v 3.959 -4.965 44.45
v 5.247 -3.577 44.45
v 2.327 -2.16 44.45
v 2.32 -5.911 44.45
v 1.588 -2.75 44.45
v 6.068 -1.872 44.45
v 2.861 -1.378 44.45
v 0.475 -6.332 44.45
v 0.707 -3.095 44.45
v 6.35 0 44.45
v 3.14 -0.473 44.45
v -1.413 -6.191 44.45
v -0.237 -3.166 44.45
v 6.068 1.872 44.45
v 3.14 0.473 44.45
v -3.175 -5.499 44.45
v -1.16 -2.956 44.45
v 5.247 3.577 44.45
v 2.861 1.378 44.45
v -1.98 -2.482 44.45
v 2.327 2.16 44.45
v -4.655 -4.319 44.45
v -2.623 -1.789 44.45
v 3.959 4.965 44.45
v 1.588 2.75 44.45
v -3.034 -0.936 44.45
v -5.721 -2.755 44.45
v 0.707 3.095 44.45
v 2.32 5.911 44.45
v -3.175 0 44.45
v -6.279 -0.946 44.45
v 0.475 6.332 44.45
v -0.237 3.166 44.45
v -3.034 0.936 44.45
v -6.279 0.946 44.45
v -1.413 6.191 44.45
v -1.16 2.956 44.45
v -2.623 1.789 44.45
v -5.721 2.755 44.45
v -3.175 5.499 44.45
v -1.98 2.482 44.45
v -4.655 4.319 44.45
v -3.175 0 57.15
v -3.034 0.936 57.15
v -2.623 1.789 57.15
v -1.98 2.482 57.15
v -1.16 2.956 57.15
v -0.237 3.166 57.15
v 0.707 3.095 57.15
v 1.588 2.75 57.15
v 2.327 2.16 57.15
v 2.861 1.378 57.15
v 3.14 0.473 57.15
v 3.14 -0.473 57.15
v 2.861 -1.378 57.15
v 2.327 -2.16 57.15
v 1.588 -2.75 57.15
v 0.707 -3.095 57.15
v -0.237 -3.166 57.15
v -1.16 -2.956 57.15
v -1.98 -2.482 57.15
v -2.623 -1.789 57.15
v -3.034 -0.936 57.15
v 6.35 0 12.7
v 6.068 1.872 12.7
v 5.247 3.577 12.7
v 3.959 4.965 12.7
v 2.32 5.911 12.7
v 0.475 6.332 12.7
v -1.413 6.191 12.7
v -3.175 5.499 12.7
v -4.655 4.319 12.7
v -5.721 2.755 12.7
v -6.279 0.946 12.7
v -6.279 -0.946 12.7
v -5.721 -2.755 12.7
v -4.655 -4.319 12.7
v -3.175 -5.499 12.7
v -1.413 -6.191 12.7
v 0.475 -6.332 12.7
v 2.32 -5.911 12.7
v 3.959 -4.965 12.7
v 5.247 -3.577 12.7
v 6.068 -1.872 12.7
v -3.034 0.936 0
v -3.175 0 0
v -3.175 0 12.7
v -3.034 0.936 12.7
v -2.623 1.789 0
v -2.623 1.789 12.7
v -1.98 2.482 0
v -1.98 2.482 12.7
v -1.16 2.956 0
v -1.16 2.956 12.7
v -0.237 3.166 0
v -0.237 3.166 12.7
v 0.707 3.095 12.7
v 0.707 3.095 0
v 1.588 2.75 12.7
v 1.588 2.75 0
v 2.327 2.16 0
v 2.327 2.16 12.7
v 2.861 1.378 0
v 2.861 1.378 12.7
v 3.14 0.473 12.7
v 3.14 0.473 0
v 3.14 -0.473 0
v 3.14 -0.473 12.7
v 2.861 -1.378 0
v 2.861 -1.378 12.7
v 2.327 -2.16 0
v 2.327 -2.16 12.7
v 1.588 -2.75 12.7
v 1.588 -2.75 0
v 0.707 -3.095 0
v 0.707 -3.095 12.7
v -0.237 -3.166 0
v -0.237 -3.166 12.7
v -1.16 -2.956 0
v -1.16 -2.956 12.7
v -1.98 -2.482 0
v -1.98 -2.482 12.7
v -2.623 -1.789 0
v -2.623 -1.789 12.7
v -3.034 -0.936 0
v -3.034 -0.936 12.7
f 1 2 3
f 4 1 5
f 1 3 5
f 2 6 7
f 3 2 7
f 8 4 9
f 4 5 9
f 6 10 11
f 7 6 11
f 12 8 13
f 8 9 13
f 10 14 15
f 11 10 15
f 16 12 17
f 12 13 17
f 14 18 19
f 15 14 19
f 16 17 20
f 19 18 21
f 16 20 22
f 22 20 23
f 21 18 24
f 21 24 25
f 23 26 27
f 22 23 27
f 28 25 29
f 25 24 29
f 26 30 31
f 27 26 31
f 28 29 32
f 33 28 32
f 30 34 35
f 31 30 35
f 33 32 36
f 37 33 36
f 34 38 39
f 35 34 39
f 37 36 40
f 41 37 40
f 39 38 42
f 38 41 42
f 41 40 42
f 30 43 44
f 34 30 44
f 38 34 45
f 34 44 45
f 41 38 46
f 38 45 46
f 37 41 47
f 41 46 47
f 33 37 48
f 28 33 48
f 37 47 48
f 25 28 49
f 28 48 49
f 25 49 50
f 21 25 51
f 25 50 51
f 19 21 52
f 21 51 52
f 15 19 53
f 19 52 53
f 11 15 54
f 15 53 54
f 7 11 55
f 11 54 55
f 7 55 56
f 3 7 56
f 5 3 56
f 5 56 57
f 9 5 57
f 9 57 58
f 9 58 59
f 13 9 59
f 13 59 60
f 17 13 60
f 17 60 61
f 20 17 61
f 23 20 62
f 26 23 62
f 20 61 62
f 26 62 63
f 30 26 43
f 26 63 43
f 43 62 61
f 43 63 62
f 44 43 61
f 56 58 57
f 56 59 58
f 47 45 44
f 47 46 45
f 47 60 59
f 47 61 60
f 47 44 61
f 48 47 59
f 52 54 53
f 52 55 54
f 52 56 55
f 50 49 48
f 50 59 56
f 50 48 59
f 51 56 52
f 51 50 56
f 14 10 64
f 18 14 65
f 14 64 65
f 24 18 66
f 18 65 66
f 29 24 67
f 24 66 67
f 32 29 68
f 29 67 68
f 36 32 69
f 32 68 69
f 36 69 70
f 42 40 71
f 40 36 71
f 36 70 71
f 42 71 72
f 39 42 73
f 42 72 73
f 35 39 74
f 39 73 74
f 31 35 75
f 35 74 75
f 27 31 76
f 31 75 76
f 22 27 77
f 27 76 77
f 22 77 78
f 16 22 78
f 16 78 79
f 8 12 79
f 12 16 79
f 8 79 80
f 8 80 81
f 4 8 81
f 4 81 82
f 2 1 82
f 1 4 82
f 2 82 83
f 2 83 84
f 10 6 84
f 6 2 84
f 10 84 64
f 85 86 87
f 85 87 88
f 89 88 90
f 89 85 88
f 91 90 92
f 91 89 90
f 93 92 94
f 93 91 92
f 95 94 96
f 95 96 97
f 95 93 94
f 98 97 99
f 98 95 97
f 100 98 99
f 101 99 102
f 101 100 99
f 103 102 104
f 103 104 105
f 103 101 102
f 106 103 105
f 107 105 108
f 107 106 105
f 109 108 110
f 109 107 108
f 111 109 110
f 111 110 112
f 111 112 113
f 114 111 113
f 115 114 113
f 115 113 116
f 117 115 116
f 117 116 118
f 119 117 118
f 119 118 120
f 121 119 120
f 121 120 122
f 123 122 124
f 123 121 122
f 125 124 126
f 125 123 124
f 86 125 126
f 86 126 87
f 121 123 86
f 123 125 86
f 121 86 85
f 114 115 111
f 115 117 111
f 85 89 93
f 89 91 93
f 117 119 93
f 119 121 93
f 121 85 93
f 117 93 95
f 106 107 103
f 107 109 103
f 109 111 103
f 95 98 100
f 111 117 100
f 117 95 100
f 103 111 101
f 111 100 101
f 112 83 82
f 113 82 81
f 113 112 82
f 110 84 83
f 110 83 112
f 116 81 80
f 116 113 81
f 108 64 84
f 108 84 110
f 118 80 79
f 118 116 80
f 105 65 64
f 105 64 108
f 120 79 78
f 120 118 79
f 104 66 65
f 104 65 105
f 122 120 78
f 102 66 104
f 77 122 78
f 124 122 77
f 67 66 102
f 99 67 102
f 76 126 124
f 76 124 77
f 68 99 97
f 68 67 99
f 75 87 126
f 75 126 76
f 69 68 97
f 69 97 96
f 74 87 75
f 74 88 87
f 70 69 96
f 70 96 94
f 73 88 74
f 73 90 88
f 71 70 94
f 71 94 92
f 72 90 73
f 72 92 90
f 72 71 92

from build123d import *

# Parameters (mm, degrees)
SKETCH1_R           = 6.35
BOSS_EXTRUDE1_DEPTH = 57.15
SKETCH3_R           = 6.35
SKETCH3_R_2         = 3.175
CUT_EXTRUDE1_DEPTH  = 12.7


with BuildPart() as part:
    # Sketch1 → Boss-Extrude1 (new body)
    with BuildSketch(Plane.XY):
        Circle(SKETCH1_R)
    extrude(amount=BOSS_EXTRUDE1_DEPTH)

    # Sketch3 → Cut-Extrude1 (cut)
    with BuildSketch(Plane(origin=(0, 0, 0), x_dir=(-1, 0, 0), z_dir=(0, 0, -1))):
        Circle(SKETCH3_R)
        Circle(SKETCH3_R_2, mode=Mode.SUBTRACT)
    cut_extrude1 = extrude(amount=-CUT_EXTRUDE1_DEPTH, mode=Mode.SUBTRACT)

    # Mirror1: Cut-Extrude1 across plane
    add(cut_extrude1.mirror(Plane.XY.offset(28.575)), mode=Mode.SUBTRACT)


solid = part.part
